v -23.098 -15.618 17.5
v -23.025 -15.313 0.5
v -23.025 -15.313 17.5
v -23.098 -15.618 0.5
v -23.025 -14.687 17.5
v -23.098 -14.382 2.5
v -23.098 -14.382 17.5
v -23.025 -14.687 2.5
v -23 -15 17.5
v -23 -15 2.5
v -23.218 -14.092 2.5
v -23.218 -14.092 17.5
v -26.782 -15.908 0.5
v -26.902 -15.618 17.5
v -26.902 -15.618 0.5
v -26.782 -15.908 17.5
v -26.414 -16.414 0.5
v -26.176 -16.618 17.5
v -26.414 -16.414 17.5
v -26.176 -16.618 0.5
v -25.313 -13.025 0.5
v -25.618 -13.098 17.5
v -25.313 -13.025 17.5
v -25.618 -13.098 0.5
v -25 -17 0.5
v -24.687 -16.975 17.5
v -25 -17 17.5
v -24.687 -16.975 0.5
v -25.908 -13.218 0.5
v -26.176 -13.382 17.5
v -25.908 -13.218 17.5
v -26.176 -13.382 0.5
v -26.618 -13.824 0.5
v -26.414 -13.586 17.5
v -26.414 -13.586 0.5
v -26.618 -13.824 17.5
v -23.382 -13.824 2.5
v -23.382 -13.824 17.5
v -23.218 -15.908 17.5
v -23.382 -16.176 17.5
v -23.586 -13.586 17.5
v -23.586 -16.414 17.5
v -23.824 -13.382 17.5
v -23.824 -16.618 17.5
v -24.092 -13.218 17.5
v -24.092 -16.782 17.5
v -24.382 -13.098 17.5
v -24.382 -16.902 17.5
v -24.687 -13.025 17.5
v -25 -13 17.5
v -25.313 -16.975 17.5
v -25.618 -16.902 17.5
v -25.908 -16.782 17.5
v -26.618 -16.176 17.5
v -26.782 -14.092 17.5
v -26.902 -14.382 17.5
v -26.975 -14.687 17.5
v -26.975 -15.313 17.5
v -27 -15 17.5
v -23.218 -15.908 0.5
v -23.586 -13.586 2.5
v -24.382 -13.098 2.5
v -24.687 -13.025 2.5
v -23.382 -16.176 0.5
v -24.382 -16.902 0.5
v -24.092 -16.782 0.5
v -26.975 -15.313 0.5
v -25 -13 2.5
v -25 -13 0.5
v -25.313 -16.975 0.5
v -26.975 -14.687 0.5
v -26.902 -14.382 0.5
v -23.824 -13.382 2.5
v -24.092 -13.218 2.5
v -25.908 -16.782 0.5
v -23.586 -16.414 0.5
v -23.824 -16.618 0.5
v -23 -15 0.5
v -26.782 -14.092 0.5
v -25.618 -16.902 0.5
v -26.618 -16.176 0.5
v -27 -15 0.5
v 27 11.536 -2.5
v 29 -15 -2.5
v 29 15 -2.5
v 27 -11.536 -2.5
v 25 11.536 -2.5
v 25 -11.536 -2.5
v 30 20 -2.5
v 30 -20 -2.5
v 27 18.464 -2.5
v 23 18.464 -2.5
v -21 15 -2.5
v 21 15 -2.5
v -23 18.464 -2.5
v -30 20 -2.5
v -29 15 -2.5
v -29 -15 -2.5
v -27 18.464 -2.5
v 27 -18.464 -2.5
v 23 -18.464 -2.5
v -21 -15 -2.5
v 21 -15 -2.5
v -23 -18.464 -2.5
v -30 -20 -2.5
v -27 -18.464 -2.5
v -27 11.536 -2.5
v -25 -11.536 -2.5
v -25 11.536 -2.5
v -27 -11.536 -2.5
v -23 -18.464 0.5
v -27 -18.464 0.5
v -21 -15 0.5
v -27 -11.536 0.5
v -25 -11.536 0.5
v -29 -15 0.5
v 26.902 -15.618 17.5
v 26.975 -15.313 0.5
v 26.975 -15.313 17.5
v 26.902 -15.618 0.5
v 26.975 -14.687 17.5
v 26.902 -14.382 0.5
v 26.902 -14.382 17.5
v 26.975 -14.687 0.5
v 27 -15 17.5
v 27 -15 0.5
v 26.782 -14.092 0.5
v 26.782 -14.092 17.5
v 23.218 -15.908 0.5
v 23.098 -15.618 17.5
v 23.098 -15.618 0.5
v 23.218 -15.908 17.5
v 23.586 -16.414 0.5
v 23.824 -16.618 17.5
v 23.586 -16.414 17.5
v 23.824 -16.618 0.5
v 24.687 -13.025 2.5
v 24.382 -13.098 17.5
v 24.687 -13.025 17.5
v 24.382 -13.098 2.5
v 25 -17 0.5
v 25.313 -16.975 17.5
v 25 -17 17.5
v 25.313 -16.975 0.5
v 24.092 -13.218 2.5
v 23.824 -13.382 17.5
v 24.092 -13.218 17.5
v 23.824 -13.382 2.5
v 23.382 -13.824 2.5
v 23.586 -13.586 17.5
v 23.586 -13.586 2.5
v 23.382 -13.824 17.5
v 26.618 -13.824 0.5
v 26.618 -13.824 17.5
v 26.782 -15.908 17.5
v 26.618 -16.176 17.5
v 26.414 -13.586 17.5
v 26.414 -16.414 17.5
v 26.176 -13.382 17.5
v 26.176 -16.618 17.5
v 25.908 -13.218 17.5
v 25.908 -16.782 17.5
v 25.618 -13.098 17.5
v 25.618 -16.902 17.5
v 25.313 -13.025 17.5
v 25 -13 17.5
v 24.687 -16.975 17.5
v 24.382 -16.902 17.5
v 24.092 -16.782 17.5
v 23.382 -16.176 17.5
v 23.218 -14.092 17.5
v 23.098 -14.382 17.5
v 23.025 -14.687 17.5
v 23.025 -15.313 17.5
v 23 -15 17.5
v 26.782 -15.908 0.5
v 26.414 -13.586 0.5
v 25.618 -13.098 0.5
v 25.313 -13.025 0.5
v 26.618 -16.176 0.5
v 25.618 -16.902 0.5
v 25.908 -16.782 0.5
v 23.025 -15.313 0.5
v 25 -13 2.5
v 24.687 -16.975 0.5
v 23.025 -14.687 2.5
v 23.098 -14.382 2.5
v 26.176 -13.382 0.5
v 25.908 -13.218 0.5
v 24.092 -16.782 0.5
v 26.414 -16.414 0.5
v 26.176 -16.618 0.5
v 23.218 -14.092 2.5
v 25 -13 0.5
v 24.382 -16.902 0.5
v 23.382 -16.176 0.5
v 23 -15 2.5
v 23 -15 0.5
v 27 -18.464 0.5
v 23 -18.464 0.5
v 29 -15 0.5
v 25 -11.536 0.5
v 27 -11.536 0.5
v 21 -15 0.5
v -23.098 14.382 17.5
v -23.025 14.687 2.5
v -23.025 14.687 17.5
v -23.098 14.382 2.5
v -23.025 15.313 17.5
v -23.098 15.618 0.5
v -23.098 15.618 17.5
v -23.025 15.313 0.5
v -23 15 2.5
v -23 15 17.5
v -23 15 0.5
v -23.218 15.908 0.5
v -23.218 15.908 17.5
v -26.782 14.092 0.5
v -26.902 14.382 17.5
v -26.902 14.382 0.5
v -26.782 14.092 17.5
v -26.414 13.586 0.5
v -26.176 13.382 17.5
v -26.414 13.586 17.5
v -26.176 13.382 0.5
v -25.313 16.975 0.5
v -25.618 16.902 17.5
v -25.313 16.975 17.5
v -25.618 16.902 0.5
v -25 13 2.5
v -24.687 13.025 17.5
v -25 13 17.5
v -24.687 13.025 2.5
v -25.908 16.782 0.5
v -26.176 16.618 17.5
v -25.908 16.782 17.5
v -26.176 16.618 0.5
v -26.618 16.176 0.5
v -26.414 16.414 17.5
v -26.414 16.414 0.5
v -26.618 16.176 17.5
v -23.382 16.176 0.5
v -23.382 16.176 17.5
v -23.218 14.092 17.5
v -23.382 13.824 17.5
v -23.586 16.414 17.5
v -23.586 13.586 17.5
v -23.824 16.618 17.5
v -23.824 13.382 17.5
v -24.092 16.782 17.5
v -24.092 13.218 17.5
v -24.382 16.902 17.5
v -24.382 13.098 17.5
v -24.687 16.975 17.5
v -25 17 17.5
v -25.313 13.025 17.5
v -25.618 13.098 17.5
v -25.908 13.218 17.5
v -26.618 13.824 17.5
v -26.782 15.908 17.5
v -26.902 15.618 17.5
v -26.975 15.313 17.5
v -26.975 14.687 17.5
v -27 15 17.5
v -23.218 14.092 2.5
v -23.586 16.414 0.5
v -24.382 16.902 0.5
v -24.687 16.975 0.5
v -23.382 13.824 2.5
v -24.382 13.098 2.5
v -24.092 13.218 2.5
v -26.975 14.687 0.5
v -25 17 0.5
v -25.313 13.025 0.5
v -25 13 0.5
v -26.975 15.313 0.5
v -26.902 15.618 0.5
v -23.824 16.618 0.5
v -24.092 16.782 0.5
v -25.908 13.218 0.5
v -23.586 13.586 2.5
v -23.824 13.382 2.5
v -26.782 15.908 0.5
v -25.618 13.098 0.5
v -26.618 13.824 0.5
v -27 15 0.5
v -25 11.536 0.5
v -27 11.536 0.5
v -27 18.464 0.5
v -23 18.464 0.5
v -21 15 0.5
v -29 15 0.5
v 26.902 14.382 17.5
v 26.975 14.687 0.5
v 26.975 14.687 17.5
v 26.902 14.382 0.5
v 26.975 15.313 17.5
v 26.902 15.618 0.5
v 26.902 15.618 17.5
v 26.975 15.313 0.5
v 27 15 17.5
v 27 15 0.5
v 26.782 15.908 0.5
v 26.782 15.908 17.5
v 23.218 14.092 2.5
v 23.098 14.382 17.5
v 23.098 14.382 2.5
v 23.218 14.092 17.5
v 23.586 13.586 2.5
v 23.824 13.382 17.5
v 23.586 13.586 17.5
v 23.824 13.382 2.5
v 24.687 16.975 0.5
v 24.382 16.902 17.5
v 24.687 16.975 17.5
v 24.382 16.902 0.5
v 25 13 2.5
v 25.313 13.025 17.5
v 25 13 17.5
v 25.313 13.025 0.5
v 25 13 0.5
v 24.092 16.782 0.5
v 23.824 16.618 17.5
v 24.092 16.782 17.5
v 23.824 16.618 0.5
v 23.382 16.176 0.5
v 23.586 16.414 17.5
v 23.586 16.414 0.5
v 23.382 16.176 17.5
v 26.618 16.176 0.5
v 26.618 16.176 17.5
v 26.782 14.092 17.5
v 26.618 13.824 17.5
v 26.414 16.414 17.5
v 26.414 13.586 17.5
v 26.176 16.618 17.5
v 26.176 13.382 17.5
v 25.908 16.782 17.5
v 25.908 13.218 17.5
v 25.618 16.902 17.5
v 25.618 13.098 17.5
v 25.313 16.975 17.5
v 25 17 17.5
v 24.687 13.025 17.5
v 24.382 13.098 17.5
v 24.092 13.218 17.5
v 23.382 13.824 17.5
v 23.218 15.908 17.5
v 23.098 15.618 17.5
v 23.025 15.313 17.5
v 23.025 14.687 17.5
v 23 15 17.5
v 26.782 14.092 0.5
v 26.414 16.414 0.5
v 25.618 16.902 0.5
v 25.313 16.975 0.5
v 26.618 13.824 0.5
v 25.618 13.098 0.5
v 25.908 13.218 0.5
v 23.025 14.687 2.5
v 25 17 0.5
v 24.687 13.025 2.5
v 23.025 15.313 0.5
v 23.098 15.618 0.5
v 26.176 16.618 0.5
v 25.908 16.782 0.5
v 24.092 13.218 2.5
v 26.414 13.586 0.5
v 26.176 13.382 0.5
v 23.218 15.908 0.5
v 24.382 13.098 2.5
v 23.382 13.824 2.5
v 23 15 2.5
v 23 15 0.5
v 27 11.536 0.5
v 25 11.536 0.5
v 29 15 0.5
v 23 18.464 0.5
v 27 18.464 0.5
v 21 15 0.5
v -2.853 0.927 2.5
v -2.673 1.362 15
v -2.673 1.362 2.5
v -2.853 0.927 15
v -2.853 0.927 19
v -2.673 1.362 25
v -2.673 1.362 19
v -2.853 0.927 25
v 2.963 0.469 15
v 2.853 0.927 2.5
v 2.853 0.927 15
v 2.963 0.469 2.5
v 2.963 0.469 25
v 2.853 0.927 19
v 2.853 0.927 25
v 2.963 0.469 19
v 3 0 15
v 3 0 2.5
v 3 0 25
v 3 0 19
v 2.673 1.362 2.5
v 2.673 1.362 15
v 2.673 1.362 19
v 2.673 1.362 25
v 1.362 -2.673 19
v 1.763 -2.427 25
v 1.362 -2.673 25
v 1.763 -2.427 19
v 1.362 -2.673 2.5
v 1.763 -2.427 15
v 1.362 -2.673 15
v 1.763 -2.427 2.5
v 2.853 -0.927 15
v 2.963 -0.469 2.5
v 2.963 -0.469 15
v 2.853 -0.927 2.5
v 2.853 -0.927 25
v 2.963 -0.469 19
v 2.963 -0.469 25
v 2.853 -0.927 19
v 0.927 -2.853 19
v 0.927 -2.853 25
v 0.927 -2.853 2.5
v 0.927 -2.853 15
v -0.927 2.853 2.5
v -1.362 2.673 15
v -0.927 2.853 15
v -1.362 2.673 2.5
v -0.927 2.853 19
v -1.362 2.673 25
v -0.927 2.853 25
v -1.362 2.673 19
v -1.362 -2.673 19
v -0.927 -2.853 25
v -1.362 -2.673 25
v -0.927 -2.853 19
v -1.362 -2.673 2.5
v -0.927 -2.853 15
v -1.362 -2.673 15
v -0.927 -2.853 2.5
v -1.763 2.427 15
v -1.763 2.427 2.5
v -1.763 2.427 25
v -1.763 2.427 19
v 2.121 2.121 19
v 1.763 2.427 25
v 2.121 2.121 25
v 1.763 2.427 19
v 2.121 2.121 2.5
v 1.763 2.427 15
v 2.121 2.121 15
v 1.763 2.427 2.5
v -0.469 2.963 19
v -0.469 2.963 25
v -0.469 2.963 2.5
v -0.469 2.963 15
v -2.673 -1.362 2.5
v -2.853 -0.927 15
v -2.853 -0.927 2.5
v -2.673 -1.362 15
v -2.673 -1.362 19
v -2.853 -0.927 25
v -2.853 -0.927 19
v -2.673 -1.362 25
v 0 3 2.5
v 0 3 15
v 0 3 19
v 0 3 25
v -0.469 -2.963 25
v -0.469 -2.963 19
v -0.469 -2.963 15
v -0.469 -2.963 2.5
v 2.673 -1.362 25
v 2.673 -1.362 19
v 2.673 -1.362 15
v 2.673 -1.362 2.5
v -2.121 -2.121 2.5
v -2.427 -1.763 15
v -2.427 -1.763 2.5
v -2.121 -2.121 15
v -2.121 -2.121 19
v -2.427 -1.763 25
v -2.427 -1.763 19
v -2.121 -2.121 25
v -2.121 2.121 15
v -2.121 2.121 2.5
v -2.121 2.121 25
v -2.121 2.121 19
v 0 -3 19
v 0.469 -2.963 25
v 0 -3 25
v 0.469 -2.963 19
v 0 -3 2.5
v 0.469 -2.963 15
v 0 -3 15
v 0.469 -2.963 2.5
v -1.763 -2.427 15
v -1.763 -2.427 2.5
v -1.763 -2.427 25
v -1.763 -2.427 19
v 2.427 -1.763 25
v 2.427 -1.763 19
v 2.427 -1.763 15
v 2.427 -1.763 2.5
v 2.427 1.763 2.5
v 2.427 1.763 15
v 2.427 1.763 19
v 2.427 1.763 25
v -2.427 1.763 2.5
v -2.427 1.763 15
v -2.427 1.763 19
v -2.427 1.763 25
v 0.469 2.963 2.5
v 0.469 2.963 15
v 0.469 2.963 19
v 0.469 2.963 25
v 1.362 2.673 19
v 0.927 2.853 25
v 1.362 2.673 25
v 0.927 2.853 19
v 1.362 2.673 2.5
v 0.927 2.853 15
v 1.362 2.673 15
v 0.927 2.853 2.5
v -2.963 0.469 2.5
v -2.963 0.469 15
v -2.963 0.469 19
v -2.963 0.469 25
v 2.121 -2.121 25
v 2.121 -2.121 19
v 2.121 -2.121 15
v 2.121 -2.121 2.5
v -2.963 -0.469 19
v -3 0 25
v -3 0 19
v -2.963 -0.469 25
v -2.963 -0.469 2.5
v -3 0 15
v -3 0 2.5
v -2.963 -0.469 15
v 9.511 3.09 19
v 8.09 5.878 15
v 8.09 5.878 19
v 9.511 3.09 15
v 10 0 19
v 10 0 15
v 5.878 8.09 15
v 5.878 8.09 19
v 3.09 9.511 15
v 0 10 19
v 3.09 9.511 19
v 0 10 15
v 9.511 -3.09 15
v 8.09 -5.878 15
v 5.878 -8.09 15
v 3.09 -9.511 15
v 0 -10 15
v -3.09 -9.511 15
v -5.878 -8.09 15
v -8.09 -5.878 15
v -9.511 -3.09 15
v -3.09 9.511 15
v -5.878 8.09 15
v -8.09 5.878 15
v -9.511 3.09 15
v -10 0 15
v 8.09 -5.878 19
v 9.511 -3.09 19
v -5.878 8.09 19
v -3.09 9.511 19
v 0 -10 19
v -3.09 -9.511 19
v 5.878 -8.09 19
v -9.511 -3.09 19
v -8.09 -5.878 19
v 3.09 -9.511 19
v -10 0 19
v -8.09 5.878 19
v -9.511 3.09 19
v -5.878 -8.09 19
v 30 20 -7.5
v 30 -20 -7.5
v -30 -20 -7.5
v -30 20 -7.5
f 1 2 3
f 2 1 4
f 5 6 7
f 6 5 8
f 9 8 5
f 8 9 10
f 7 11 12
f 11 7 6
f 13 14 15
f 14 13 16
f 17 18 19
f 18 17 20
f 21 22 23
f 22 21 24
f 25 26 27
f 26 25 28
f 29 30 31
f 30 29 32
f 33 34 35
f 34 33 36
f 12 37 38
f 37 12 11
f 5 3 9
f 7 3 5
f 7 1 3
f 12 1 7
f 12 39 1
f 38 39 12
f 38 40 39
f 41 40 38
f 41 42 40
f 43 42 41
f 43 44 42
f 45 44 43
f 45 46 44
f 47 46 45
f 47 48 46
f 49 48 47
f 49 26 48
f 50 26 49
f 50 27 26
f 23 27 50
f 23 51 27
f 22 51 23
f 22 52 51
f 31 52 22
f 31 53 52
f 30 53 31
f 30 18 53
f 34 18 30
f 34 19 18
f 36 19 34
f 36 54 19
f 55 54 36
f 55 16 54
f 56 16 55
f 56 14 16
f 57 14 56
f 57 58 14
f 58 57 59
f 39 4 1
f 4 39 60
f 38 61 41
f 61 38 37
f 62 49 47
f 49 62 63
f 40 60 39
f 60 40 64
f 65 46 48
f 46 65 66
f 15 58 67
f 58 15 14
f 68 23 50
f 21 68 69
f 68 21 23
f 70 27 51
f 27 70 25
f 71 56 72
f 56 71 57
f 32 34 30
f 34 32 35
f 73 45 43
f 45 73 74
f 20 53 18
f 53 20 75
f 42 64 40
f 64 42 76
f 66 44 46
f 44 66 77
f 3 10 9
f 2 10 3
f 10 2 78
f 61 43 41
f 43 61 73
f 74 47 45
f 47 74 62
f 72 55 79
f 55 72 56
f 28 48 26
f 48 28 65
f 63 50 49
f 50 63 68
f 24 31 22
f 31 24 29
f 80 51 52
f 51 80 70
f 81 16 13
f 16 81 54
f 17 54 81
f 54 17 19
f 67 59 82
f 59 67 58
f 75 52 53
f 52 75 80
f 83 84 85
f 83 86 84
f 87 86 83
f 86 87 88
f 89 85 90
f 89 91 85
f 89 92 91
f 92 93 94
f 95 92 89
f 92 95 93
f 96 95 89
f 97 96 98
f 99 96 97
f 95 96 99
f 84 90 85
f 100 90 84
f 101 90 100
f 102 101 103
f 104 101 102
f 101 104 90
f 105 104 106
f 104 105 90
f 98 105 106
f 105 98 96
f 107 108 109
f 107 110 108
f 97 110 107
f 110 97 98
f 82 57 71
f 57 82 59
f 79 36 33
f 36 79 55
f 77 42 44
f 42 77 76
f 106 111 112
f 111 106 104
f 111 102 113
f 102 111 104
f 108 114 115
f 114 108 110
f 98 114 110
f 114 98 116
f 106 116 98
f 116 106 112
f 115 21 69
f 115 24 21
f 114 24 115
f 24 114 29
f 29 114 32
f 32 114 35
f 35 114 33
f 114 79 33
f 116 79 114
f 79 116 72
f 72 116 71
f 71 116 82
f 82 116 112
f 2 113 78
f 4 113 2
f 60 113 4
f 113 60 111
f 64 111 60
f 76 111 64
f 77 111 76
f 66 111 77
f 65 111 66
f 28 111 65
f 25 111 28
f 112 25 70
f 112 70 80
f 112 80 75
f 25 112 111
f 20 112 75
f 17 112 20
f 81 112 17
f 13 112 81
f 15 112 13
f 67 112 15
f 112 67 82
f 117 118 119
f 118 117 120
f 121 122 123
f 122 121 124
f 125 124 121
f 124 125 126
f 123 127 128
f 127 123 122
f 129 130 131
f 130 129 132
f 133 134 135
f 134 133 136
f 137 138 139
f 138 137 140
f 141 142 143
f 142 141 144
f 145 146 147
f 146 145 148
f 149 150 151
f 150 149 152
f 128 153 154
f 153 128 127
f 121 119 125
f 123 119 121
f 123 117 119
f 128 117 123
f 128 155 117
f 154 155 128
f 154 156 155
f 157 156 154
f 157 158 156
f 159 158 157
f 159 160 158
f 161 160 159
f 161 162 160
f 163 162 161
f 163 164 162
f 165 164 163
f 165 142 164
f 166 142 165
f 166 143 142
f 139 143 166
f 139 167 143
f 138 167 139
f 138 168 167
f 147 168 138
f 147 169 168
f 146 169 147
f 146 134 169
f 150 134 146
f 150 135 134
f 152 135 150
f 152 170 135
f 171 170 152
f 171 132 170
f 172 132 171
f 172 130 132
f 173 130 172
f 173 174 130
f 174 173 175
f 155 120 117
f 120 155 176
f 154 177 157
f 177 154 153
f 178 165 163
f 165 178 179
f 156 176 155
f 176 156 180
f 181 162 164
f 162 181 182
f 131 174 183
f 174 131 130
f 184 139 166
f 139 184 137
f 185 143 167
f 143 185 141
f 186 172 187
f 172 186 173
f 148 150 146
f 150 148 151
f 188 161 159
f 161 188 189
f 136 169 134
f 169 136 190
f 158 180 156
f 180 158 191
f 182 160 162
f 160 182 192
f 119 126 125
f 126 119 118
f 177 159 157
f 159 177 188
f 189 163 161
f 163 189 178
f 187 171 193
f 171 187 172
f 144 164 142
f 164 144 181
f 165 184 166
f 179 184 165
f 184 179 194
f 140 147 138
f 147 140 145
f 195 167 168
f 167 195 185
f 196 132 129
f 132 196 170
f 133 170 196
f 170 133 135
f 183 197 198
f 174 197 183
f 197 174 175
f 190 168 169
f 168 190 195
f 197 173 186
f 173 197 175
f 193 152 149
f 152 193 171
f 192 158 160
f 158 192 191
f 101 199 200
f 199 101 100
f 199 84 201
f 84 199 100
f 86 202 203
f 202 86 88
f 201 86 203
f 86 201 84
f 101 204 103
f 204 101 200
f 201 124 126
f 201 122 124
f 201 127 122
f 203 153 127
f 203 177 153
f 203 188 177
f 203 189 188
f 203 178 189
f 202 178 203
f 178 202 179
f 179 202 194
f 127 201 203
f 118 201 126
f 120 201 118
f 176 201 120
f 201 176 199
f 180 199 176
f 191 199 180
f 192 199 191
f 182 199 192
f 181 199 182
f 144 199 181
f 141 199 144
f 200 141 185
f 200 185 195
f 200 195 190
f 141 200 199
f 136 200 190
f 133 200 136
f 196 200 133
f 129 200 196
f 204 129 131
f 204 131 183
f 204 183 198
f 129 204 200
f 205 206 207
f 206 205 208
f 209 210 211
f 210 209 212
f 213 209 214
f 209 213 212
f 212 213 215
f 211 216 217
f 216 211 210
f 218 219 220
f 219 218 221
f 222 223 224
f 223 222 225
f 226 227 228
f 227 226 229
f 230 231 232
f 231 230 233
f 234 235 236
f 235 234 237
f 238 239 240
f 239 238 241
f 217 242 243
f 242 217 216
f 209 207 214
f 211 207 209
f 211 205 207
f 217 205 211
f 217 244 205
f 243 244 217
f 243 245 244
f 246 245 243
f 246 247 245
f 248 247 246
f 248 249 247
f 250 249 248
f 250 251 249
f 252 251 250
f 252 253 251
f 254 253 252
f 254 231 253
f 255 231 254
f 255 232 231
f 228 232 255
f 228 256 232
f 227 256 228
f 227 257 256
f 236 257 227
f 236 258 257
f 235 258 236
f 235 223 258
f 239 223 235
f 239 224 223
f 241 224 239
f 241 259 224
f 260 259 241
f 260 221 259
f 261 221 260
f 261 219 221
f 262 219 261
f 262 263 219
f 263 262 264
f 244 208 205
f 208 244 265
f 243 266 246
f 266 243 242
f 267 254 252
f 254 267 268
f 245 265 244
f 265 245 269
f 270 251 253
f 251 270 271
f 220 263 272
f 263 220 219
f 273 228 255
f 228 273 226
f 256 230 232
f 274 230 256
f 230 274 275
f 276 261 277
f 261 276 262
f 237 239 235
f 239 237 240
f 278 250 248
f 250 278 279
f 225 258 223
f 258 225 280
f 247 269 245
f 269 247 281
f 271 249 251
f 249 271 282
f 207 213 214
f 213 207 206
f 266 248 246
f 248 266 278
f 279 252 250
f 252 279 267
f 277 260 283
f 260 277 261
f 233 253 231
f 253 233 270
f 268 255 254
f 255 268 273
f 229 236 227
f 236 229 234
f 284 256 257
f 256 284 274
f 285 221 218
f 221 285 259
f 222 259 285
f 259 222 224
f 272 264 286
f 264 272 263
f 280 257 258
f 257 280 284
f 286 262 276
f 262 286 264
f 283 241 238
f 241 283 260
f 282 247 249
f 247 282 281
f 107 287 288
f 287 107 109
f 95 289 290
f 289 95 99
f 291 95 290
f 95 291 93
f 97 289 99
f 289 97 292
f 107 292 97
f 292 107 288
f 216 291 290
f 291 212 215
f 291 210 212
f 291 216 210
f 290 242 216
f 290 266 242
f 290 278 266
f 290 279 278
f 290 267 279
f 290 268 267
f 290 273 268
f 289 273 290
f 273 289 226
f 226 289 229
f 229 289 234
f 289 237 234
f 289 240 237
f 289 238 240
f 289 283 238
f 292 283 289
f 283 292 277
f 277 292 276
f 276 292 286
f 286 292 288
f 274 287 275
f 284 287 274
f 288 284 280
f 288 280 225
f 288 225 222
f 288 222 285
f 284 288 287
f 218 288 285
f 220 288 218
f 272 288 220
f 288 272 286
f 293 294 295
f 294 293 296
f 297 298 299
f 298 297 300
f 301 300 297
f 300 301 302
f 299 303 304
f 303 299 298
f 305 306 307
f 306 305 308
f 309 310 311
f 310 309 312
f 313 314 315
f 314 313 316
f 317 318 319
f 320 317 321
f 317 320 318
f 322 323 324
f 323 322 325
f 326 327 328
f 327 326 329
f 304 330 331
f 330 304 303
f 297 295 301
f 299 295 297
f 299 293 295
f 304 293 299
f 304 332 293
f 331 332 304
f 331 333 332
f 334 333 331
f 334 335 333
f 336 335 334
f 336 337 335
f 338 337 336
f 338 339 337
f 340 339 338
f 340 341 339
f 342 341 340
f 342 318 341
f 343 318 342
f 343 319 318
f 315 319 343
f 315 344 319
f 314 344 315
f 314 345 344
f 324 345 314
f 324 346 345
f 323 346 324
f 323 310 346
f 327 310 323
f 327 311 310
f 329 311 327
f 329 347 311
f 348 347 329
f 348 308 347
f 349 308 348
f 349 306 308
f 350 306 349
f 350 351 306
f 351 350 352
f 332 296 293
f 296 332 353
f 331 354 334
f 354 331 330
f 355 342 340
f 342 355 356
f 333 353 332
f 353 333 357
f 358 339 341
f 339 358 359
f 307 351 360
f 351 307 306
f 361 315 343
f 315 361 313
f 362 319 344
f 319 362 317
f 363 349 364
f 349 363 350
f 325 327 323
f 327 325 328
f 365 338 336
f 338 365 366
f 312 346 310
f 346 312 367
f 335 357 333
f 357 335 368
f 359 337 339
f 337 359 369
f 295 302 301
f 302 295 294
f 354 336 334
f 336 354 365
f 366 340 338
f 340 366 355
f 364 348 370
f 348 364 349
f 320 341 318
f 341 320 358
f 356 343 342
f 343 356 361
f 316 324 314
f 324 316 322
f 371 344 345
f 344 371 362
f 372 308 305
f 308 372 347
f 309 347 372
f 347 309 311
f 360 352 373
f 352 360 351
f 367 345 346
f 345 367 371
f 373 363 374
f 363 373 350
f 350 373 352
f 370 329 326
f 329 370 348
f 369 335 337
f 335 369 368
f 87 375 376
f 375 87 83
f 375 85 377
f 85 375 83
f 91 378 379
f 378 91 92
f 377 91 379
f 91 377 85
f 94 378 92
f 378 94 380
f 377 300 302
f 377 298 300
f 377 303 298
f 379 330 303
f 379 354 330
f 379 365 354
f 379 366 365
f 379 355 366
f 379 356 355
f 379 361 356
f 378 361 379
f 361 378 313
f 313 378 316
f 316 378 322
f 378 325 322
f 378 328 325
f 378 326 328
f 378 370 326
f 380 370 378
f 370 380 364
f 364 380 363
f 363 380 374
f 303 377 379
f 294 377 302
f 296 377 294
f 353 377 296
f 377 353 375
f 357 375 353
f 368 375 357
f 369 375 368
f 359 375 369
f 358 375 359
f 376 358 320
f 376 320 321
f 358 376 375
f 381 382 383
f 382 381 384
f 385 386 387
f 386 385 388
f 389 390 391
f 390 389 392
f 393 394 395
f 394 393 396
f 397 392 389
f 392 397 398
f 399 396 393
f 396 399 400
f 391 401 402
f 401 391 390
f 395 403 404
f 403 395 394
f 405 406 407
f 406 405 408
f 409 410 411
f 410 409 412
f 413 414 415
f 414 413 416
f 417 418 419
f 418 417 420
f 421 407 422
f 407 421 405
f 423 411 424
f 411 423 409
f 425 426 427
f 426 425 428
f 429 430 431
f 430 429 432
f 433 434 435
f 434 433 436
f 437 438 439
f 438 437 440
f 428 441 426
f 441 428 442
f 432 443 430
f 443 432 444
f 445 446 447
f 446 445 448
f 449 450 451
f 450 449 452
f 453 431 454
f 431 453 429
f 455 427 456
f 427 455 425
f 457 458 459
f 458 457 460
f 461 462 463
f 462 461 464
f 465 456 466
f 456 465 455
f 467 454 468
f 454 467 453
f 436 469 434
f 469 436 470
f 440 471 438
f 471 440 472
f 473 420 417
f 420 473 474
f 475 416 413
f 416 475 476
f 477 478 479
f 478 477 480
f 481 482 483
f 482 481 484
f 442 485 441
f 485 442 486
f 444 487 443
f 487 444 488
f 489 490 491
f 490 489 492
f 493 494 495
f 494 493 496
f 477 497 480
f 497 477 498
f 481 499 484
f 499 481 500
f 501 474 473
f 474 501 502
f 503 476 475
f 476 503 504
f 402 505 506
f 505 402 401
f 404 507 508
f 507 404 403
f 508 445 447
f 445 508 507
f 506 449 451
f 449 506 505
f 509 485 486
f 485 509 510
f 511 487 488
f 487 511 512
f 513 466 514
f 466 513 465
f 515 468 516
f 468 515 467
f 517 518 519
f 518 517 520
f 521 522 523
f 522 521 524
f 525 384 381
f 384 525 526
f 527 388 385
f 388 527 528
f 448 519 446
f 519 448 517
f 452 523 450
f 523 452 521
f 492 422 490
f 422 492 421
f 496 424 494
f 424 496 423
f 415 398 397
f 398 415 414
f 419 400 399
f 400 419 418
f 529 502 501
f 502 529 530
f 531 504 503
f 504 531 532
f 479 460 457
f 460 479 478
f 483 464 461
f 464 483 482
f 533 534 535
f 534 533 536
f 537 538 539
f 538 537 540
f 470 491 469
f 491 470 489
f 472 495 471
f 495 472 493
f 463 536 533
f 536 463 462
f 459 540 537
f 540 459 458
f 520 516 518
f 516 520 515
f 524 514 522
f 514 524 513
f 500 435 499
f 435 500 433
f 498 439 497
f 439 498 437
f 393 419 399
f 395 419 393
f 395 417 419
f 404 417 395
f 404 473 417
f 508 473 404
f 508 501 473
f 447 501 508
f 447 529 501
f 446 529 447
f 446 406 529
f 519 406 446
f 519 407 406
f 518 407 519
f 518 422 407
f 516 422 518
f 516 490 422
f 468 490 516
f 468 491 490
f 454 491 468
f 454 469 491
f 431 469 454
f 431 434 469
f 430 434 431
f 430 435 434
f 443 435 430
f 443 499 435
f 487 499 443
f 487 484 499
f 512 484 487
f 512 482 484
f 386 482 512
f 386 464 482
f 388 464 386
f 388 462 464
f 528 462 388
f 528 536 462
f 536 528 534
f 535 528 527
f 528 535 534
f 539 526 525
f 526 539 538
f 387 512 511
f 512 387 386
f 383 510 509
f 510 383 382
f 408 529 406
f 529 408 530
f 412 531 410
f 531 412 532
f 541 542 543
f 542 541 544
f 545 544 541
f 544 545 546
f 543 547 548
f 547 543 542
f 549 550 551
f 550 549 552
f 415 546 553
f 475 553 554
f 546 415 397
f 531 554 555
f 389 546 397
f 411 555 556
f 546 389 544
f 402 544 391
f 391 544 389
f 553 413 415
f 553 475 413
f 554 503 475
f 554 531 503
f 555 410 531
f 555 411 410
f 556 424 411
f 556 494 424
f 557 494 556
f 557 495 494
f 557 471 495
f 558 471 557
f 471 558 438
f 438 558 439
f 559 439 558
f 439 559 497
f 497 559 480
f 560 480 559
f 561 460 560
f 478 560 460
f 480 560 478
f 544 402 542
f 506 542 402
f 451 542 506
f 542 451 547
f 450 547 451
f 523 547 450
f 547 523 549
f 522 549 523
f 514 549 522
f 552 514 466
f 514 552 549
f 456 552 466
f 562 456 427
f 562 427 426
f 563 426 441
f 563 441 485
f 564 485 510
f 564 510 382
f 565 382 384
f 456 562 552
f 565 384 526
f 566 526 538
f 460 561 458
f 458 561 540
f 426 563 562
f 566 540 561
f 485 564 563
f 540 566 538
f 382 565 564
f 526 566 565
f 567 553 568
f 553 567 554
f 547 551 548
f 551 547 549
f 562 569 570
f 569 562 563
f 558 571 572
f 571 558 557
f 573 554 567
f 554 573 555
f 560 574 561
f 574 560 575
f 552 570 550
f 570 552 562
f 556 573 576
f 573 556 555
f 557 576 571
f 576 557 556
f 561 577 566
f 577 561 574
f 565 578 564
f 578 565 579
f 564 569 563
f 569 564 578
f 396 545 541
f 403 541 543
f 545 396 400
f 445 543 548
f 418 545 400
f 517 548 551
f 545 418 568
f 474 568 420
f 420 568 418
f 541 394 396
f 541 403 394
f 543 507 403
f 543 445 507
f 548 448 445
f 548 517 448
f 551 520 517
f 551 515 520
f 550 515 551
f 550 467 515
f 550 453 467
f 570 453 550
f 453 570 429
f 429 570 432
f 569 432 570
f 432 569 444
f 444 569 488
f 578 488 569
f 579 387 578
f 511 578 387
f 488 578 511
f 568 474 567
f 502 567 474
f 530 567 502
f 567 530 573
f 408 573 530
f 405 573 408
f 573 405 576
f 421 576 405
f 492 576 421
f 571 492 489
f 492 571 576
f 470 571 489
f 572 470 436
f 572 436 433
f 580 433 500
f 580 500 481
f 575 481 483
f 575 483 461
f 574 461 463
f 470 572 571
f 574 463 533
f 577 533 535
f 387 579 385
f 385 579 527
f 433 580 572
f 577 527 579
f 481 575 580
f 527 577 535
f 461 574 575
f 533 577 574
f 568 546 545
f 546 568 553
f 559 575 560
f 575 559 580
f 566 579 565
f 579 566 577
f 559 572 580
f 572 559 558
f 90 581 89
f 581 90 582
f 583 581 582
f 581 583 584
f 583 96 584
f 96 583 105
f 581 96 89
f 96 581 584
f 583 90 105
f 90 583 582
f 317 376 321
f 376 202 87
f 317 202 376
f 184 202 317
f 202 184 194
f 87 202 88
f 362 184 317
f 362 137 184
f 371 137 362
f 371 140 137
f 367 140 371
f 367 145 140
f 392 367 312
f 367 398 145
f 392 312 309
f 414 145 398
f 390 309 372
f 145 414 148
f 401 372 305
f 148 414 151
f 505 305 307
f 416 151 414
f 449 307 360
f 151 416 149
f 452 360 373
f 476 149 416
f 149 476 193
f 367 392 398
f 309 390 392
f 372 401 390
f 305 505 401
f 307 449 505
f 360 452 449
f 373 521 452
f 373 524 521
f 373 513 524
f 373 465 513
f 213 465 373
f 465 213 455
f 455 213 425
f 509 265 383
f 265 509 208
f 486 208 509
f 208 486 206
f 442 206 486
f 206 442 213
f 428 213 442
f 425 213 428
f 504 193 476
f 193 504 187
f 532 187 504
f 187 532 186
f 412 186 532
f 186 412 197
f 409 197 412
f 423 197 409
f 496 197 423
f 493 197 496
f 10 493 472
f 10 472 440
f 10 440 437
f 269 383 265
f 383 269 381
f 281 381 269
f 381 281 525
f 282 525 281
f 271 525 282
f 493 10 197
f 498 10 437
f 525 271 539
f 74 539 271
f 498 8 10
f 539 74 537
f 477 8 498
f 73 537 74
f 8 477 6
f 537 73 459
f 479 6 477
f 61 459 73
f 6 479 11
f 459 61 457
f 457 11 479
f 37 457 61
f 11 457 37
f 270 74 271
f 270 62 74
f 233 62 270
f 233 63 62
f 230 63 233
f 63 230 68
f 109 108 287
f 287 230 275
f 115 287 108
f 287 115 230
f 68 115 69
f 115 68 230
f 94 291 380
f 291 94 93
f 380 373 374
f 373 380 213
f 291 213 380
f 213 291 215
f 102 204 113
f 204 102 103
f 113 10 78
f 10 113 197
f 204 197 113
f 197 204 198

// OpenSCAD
// tutorial/advanced/01_animate_assembly.scad
// ==============================================
// 学习目标: 使用 $t 变量创建动画装配演示
// OpenSCAD 动画: View → Animate (或 `open animation`)
// $t 从 0 到 1 循环变化

$fn = 40;

// ---- 爆炸视图装配 ----
module explode_view(
    explode_distance = 0,  // 0=装配, 1=完全展开
    rotation         = 0   // 旋转角度
) {
    // 底板
    color("gray")
        translate([0, 0, -5])
            cube([60, 40, 5], center = true);

    // 4 个螺丝 — 爆炸方向
    screw_positions = [
        [-25, -15], [25, -15], [-25, 15], [25, 15]
    ];
    for (pos = screw_positions) {
        translate([pos[0], pos[1], explode_distance * 15])
            color("silver")
                translate([0, 0, -2.5]) {
                    cylinder(r = 2, h = 20);
                    cylinder(r = 4, h = 3, $fn = 6);
                }
    }

    // 中间板
    color("steelblue", alpha = 0.7)
        translate([0, 0, explode_distance * 5])
            cube([50, 30, 5], center = true);

    // 齿轮轴
    translate([0, 0, explode_distance * 25]) {
        color("gold") {
            cylinder(r = 3, h = 25);
            // 齿轮
            translate([0, 0, 15])
                color("silver")
                    cylinder(r = 10, h = 4, $fn = 20);
        }
    }

    // 顶盖
    color("darkred", alpha = 0.5)
        translate([0, 0, explode_distance * 40])
            cube([45, 25, 3], center = true);
}

// ---- 活塞动画 ----
module piston_animation(
    crank_angle = 0  // 0-360 度
) {
    crank_r   = 12;
    rod_len   = 35;
    piston_r  = 10;
    piston_h  = 8;
    cylinder_h = 30;

    // 曲轴中心位置
    crank_x = crank_r * cos(crank_angle);
    crank_y = crank_r * sin(crank_angle);

    // 活塞位置 (几何约束)
    piston_y = crank_y + sqrt(rod_len * rod_len - crank_x * crank_x);

    // 气缸
    color("gray", alpha = 0.3)
        translate([0, 0, cylinder_h / 2])
            cube([piston_r * 2.2, piston_r * 2.2, cylinder_h],
                 center = true);

    // 活塞
    translate([0, piston_y, 0])
        color("orange")
            cylinder(r = piston_r, h = piston_h, center = true);

    // 连杆
    color("silver")
        hull() {
            translate([crank_x, crank_y, 0]) sphere(r = 2);
            translate([0, piston_y, 0])      sphere(r = 2);
        }

    // 曲轴
    color("gold")
        translate([0, 0, 0])
            cylinder(r = 3, h = piston_r * 0.8, center = true);

    // 飞轮
    color("darkgray")
        rotate_extrude(angle = 360) {
            translate([crank_r, 0, 0])
                square([3, 2], center = true);
        }
}

// ---- 齿轮啮合动画 ----
module gear_pair_animation() {
    teeth1 = 20;
    teeth2 = 12;
    module_g = 2;
    ratio = teeth2 / teeth1;

    // 齿轮 1 (主动)
    color("steelblue")
        rotate([0, 0, $t * 360]) {
            cylinder(r = teeth1 * module_g / 2, h = 6, $fn = teeth1 * 3);
            // 齿标记
            for (i = [0 : teeth1 - 1]) {
                rotate([0, 0, i * 360 / teeth1])
                    translate([teeth1 * module_g / 2, 0, 3])
                        cube([module_g, 1, 3], center = true);
            }
        }

    // 齿轮 2 (从动, 反向旋转)
    distance = (teeth1 + teeth2) * module_g / 2;
    translate([distance, 0, 0])
        color("darkred")
            rotate([0, 0, -$t * 360 / ratio + 180 / teeth1]) {
                cylinder(r = teeth2 * module_g / 2, h = 6,
                         $fn = teeth2 * 3);
                for (i = [0 : teeth2 - 1]) {
                    rotate([0, 0, i * 360 / teeth2])
                        translate([teeth2 * module_g / 2, 0, 3])
                            cube([module_g, 1, 3], center = true);
                }
            }
}

// ---- 场景选择 (使用 $t 切换) ----
// 使用 Customizer 可以选择不同演示
scene = 1; // [1:Explode View, 2:Piston, 3:Gear Pair]

if (scene == 1) {
    explode_view(explode_distance = $t, rotation = $t * 360);
} else if (scene == 2) {
    translate([0, -10, 0])
        piston_animation(crank_angle = $t * 360);
} else {
    translate([-20, 0, 0])
        gear_pair_animation();
}
